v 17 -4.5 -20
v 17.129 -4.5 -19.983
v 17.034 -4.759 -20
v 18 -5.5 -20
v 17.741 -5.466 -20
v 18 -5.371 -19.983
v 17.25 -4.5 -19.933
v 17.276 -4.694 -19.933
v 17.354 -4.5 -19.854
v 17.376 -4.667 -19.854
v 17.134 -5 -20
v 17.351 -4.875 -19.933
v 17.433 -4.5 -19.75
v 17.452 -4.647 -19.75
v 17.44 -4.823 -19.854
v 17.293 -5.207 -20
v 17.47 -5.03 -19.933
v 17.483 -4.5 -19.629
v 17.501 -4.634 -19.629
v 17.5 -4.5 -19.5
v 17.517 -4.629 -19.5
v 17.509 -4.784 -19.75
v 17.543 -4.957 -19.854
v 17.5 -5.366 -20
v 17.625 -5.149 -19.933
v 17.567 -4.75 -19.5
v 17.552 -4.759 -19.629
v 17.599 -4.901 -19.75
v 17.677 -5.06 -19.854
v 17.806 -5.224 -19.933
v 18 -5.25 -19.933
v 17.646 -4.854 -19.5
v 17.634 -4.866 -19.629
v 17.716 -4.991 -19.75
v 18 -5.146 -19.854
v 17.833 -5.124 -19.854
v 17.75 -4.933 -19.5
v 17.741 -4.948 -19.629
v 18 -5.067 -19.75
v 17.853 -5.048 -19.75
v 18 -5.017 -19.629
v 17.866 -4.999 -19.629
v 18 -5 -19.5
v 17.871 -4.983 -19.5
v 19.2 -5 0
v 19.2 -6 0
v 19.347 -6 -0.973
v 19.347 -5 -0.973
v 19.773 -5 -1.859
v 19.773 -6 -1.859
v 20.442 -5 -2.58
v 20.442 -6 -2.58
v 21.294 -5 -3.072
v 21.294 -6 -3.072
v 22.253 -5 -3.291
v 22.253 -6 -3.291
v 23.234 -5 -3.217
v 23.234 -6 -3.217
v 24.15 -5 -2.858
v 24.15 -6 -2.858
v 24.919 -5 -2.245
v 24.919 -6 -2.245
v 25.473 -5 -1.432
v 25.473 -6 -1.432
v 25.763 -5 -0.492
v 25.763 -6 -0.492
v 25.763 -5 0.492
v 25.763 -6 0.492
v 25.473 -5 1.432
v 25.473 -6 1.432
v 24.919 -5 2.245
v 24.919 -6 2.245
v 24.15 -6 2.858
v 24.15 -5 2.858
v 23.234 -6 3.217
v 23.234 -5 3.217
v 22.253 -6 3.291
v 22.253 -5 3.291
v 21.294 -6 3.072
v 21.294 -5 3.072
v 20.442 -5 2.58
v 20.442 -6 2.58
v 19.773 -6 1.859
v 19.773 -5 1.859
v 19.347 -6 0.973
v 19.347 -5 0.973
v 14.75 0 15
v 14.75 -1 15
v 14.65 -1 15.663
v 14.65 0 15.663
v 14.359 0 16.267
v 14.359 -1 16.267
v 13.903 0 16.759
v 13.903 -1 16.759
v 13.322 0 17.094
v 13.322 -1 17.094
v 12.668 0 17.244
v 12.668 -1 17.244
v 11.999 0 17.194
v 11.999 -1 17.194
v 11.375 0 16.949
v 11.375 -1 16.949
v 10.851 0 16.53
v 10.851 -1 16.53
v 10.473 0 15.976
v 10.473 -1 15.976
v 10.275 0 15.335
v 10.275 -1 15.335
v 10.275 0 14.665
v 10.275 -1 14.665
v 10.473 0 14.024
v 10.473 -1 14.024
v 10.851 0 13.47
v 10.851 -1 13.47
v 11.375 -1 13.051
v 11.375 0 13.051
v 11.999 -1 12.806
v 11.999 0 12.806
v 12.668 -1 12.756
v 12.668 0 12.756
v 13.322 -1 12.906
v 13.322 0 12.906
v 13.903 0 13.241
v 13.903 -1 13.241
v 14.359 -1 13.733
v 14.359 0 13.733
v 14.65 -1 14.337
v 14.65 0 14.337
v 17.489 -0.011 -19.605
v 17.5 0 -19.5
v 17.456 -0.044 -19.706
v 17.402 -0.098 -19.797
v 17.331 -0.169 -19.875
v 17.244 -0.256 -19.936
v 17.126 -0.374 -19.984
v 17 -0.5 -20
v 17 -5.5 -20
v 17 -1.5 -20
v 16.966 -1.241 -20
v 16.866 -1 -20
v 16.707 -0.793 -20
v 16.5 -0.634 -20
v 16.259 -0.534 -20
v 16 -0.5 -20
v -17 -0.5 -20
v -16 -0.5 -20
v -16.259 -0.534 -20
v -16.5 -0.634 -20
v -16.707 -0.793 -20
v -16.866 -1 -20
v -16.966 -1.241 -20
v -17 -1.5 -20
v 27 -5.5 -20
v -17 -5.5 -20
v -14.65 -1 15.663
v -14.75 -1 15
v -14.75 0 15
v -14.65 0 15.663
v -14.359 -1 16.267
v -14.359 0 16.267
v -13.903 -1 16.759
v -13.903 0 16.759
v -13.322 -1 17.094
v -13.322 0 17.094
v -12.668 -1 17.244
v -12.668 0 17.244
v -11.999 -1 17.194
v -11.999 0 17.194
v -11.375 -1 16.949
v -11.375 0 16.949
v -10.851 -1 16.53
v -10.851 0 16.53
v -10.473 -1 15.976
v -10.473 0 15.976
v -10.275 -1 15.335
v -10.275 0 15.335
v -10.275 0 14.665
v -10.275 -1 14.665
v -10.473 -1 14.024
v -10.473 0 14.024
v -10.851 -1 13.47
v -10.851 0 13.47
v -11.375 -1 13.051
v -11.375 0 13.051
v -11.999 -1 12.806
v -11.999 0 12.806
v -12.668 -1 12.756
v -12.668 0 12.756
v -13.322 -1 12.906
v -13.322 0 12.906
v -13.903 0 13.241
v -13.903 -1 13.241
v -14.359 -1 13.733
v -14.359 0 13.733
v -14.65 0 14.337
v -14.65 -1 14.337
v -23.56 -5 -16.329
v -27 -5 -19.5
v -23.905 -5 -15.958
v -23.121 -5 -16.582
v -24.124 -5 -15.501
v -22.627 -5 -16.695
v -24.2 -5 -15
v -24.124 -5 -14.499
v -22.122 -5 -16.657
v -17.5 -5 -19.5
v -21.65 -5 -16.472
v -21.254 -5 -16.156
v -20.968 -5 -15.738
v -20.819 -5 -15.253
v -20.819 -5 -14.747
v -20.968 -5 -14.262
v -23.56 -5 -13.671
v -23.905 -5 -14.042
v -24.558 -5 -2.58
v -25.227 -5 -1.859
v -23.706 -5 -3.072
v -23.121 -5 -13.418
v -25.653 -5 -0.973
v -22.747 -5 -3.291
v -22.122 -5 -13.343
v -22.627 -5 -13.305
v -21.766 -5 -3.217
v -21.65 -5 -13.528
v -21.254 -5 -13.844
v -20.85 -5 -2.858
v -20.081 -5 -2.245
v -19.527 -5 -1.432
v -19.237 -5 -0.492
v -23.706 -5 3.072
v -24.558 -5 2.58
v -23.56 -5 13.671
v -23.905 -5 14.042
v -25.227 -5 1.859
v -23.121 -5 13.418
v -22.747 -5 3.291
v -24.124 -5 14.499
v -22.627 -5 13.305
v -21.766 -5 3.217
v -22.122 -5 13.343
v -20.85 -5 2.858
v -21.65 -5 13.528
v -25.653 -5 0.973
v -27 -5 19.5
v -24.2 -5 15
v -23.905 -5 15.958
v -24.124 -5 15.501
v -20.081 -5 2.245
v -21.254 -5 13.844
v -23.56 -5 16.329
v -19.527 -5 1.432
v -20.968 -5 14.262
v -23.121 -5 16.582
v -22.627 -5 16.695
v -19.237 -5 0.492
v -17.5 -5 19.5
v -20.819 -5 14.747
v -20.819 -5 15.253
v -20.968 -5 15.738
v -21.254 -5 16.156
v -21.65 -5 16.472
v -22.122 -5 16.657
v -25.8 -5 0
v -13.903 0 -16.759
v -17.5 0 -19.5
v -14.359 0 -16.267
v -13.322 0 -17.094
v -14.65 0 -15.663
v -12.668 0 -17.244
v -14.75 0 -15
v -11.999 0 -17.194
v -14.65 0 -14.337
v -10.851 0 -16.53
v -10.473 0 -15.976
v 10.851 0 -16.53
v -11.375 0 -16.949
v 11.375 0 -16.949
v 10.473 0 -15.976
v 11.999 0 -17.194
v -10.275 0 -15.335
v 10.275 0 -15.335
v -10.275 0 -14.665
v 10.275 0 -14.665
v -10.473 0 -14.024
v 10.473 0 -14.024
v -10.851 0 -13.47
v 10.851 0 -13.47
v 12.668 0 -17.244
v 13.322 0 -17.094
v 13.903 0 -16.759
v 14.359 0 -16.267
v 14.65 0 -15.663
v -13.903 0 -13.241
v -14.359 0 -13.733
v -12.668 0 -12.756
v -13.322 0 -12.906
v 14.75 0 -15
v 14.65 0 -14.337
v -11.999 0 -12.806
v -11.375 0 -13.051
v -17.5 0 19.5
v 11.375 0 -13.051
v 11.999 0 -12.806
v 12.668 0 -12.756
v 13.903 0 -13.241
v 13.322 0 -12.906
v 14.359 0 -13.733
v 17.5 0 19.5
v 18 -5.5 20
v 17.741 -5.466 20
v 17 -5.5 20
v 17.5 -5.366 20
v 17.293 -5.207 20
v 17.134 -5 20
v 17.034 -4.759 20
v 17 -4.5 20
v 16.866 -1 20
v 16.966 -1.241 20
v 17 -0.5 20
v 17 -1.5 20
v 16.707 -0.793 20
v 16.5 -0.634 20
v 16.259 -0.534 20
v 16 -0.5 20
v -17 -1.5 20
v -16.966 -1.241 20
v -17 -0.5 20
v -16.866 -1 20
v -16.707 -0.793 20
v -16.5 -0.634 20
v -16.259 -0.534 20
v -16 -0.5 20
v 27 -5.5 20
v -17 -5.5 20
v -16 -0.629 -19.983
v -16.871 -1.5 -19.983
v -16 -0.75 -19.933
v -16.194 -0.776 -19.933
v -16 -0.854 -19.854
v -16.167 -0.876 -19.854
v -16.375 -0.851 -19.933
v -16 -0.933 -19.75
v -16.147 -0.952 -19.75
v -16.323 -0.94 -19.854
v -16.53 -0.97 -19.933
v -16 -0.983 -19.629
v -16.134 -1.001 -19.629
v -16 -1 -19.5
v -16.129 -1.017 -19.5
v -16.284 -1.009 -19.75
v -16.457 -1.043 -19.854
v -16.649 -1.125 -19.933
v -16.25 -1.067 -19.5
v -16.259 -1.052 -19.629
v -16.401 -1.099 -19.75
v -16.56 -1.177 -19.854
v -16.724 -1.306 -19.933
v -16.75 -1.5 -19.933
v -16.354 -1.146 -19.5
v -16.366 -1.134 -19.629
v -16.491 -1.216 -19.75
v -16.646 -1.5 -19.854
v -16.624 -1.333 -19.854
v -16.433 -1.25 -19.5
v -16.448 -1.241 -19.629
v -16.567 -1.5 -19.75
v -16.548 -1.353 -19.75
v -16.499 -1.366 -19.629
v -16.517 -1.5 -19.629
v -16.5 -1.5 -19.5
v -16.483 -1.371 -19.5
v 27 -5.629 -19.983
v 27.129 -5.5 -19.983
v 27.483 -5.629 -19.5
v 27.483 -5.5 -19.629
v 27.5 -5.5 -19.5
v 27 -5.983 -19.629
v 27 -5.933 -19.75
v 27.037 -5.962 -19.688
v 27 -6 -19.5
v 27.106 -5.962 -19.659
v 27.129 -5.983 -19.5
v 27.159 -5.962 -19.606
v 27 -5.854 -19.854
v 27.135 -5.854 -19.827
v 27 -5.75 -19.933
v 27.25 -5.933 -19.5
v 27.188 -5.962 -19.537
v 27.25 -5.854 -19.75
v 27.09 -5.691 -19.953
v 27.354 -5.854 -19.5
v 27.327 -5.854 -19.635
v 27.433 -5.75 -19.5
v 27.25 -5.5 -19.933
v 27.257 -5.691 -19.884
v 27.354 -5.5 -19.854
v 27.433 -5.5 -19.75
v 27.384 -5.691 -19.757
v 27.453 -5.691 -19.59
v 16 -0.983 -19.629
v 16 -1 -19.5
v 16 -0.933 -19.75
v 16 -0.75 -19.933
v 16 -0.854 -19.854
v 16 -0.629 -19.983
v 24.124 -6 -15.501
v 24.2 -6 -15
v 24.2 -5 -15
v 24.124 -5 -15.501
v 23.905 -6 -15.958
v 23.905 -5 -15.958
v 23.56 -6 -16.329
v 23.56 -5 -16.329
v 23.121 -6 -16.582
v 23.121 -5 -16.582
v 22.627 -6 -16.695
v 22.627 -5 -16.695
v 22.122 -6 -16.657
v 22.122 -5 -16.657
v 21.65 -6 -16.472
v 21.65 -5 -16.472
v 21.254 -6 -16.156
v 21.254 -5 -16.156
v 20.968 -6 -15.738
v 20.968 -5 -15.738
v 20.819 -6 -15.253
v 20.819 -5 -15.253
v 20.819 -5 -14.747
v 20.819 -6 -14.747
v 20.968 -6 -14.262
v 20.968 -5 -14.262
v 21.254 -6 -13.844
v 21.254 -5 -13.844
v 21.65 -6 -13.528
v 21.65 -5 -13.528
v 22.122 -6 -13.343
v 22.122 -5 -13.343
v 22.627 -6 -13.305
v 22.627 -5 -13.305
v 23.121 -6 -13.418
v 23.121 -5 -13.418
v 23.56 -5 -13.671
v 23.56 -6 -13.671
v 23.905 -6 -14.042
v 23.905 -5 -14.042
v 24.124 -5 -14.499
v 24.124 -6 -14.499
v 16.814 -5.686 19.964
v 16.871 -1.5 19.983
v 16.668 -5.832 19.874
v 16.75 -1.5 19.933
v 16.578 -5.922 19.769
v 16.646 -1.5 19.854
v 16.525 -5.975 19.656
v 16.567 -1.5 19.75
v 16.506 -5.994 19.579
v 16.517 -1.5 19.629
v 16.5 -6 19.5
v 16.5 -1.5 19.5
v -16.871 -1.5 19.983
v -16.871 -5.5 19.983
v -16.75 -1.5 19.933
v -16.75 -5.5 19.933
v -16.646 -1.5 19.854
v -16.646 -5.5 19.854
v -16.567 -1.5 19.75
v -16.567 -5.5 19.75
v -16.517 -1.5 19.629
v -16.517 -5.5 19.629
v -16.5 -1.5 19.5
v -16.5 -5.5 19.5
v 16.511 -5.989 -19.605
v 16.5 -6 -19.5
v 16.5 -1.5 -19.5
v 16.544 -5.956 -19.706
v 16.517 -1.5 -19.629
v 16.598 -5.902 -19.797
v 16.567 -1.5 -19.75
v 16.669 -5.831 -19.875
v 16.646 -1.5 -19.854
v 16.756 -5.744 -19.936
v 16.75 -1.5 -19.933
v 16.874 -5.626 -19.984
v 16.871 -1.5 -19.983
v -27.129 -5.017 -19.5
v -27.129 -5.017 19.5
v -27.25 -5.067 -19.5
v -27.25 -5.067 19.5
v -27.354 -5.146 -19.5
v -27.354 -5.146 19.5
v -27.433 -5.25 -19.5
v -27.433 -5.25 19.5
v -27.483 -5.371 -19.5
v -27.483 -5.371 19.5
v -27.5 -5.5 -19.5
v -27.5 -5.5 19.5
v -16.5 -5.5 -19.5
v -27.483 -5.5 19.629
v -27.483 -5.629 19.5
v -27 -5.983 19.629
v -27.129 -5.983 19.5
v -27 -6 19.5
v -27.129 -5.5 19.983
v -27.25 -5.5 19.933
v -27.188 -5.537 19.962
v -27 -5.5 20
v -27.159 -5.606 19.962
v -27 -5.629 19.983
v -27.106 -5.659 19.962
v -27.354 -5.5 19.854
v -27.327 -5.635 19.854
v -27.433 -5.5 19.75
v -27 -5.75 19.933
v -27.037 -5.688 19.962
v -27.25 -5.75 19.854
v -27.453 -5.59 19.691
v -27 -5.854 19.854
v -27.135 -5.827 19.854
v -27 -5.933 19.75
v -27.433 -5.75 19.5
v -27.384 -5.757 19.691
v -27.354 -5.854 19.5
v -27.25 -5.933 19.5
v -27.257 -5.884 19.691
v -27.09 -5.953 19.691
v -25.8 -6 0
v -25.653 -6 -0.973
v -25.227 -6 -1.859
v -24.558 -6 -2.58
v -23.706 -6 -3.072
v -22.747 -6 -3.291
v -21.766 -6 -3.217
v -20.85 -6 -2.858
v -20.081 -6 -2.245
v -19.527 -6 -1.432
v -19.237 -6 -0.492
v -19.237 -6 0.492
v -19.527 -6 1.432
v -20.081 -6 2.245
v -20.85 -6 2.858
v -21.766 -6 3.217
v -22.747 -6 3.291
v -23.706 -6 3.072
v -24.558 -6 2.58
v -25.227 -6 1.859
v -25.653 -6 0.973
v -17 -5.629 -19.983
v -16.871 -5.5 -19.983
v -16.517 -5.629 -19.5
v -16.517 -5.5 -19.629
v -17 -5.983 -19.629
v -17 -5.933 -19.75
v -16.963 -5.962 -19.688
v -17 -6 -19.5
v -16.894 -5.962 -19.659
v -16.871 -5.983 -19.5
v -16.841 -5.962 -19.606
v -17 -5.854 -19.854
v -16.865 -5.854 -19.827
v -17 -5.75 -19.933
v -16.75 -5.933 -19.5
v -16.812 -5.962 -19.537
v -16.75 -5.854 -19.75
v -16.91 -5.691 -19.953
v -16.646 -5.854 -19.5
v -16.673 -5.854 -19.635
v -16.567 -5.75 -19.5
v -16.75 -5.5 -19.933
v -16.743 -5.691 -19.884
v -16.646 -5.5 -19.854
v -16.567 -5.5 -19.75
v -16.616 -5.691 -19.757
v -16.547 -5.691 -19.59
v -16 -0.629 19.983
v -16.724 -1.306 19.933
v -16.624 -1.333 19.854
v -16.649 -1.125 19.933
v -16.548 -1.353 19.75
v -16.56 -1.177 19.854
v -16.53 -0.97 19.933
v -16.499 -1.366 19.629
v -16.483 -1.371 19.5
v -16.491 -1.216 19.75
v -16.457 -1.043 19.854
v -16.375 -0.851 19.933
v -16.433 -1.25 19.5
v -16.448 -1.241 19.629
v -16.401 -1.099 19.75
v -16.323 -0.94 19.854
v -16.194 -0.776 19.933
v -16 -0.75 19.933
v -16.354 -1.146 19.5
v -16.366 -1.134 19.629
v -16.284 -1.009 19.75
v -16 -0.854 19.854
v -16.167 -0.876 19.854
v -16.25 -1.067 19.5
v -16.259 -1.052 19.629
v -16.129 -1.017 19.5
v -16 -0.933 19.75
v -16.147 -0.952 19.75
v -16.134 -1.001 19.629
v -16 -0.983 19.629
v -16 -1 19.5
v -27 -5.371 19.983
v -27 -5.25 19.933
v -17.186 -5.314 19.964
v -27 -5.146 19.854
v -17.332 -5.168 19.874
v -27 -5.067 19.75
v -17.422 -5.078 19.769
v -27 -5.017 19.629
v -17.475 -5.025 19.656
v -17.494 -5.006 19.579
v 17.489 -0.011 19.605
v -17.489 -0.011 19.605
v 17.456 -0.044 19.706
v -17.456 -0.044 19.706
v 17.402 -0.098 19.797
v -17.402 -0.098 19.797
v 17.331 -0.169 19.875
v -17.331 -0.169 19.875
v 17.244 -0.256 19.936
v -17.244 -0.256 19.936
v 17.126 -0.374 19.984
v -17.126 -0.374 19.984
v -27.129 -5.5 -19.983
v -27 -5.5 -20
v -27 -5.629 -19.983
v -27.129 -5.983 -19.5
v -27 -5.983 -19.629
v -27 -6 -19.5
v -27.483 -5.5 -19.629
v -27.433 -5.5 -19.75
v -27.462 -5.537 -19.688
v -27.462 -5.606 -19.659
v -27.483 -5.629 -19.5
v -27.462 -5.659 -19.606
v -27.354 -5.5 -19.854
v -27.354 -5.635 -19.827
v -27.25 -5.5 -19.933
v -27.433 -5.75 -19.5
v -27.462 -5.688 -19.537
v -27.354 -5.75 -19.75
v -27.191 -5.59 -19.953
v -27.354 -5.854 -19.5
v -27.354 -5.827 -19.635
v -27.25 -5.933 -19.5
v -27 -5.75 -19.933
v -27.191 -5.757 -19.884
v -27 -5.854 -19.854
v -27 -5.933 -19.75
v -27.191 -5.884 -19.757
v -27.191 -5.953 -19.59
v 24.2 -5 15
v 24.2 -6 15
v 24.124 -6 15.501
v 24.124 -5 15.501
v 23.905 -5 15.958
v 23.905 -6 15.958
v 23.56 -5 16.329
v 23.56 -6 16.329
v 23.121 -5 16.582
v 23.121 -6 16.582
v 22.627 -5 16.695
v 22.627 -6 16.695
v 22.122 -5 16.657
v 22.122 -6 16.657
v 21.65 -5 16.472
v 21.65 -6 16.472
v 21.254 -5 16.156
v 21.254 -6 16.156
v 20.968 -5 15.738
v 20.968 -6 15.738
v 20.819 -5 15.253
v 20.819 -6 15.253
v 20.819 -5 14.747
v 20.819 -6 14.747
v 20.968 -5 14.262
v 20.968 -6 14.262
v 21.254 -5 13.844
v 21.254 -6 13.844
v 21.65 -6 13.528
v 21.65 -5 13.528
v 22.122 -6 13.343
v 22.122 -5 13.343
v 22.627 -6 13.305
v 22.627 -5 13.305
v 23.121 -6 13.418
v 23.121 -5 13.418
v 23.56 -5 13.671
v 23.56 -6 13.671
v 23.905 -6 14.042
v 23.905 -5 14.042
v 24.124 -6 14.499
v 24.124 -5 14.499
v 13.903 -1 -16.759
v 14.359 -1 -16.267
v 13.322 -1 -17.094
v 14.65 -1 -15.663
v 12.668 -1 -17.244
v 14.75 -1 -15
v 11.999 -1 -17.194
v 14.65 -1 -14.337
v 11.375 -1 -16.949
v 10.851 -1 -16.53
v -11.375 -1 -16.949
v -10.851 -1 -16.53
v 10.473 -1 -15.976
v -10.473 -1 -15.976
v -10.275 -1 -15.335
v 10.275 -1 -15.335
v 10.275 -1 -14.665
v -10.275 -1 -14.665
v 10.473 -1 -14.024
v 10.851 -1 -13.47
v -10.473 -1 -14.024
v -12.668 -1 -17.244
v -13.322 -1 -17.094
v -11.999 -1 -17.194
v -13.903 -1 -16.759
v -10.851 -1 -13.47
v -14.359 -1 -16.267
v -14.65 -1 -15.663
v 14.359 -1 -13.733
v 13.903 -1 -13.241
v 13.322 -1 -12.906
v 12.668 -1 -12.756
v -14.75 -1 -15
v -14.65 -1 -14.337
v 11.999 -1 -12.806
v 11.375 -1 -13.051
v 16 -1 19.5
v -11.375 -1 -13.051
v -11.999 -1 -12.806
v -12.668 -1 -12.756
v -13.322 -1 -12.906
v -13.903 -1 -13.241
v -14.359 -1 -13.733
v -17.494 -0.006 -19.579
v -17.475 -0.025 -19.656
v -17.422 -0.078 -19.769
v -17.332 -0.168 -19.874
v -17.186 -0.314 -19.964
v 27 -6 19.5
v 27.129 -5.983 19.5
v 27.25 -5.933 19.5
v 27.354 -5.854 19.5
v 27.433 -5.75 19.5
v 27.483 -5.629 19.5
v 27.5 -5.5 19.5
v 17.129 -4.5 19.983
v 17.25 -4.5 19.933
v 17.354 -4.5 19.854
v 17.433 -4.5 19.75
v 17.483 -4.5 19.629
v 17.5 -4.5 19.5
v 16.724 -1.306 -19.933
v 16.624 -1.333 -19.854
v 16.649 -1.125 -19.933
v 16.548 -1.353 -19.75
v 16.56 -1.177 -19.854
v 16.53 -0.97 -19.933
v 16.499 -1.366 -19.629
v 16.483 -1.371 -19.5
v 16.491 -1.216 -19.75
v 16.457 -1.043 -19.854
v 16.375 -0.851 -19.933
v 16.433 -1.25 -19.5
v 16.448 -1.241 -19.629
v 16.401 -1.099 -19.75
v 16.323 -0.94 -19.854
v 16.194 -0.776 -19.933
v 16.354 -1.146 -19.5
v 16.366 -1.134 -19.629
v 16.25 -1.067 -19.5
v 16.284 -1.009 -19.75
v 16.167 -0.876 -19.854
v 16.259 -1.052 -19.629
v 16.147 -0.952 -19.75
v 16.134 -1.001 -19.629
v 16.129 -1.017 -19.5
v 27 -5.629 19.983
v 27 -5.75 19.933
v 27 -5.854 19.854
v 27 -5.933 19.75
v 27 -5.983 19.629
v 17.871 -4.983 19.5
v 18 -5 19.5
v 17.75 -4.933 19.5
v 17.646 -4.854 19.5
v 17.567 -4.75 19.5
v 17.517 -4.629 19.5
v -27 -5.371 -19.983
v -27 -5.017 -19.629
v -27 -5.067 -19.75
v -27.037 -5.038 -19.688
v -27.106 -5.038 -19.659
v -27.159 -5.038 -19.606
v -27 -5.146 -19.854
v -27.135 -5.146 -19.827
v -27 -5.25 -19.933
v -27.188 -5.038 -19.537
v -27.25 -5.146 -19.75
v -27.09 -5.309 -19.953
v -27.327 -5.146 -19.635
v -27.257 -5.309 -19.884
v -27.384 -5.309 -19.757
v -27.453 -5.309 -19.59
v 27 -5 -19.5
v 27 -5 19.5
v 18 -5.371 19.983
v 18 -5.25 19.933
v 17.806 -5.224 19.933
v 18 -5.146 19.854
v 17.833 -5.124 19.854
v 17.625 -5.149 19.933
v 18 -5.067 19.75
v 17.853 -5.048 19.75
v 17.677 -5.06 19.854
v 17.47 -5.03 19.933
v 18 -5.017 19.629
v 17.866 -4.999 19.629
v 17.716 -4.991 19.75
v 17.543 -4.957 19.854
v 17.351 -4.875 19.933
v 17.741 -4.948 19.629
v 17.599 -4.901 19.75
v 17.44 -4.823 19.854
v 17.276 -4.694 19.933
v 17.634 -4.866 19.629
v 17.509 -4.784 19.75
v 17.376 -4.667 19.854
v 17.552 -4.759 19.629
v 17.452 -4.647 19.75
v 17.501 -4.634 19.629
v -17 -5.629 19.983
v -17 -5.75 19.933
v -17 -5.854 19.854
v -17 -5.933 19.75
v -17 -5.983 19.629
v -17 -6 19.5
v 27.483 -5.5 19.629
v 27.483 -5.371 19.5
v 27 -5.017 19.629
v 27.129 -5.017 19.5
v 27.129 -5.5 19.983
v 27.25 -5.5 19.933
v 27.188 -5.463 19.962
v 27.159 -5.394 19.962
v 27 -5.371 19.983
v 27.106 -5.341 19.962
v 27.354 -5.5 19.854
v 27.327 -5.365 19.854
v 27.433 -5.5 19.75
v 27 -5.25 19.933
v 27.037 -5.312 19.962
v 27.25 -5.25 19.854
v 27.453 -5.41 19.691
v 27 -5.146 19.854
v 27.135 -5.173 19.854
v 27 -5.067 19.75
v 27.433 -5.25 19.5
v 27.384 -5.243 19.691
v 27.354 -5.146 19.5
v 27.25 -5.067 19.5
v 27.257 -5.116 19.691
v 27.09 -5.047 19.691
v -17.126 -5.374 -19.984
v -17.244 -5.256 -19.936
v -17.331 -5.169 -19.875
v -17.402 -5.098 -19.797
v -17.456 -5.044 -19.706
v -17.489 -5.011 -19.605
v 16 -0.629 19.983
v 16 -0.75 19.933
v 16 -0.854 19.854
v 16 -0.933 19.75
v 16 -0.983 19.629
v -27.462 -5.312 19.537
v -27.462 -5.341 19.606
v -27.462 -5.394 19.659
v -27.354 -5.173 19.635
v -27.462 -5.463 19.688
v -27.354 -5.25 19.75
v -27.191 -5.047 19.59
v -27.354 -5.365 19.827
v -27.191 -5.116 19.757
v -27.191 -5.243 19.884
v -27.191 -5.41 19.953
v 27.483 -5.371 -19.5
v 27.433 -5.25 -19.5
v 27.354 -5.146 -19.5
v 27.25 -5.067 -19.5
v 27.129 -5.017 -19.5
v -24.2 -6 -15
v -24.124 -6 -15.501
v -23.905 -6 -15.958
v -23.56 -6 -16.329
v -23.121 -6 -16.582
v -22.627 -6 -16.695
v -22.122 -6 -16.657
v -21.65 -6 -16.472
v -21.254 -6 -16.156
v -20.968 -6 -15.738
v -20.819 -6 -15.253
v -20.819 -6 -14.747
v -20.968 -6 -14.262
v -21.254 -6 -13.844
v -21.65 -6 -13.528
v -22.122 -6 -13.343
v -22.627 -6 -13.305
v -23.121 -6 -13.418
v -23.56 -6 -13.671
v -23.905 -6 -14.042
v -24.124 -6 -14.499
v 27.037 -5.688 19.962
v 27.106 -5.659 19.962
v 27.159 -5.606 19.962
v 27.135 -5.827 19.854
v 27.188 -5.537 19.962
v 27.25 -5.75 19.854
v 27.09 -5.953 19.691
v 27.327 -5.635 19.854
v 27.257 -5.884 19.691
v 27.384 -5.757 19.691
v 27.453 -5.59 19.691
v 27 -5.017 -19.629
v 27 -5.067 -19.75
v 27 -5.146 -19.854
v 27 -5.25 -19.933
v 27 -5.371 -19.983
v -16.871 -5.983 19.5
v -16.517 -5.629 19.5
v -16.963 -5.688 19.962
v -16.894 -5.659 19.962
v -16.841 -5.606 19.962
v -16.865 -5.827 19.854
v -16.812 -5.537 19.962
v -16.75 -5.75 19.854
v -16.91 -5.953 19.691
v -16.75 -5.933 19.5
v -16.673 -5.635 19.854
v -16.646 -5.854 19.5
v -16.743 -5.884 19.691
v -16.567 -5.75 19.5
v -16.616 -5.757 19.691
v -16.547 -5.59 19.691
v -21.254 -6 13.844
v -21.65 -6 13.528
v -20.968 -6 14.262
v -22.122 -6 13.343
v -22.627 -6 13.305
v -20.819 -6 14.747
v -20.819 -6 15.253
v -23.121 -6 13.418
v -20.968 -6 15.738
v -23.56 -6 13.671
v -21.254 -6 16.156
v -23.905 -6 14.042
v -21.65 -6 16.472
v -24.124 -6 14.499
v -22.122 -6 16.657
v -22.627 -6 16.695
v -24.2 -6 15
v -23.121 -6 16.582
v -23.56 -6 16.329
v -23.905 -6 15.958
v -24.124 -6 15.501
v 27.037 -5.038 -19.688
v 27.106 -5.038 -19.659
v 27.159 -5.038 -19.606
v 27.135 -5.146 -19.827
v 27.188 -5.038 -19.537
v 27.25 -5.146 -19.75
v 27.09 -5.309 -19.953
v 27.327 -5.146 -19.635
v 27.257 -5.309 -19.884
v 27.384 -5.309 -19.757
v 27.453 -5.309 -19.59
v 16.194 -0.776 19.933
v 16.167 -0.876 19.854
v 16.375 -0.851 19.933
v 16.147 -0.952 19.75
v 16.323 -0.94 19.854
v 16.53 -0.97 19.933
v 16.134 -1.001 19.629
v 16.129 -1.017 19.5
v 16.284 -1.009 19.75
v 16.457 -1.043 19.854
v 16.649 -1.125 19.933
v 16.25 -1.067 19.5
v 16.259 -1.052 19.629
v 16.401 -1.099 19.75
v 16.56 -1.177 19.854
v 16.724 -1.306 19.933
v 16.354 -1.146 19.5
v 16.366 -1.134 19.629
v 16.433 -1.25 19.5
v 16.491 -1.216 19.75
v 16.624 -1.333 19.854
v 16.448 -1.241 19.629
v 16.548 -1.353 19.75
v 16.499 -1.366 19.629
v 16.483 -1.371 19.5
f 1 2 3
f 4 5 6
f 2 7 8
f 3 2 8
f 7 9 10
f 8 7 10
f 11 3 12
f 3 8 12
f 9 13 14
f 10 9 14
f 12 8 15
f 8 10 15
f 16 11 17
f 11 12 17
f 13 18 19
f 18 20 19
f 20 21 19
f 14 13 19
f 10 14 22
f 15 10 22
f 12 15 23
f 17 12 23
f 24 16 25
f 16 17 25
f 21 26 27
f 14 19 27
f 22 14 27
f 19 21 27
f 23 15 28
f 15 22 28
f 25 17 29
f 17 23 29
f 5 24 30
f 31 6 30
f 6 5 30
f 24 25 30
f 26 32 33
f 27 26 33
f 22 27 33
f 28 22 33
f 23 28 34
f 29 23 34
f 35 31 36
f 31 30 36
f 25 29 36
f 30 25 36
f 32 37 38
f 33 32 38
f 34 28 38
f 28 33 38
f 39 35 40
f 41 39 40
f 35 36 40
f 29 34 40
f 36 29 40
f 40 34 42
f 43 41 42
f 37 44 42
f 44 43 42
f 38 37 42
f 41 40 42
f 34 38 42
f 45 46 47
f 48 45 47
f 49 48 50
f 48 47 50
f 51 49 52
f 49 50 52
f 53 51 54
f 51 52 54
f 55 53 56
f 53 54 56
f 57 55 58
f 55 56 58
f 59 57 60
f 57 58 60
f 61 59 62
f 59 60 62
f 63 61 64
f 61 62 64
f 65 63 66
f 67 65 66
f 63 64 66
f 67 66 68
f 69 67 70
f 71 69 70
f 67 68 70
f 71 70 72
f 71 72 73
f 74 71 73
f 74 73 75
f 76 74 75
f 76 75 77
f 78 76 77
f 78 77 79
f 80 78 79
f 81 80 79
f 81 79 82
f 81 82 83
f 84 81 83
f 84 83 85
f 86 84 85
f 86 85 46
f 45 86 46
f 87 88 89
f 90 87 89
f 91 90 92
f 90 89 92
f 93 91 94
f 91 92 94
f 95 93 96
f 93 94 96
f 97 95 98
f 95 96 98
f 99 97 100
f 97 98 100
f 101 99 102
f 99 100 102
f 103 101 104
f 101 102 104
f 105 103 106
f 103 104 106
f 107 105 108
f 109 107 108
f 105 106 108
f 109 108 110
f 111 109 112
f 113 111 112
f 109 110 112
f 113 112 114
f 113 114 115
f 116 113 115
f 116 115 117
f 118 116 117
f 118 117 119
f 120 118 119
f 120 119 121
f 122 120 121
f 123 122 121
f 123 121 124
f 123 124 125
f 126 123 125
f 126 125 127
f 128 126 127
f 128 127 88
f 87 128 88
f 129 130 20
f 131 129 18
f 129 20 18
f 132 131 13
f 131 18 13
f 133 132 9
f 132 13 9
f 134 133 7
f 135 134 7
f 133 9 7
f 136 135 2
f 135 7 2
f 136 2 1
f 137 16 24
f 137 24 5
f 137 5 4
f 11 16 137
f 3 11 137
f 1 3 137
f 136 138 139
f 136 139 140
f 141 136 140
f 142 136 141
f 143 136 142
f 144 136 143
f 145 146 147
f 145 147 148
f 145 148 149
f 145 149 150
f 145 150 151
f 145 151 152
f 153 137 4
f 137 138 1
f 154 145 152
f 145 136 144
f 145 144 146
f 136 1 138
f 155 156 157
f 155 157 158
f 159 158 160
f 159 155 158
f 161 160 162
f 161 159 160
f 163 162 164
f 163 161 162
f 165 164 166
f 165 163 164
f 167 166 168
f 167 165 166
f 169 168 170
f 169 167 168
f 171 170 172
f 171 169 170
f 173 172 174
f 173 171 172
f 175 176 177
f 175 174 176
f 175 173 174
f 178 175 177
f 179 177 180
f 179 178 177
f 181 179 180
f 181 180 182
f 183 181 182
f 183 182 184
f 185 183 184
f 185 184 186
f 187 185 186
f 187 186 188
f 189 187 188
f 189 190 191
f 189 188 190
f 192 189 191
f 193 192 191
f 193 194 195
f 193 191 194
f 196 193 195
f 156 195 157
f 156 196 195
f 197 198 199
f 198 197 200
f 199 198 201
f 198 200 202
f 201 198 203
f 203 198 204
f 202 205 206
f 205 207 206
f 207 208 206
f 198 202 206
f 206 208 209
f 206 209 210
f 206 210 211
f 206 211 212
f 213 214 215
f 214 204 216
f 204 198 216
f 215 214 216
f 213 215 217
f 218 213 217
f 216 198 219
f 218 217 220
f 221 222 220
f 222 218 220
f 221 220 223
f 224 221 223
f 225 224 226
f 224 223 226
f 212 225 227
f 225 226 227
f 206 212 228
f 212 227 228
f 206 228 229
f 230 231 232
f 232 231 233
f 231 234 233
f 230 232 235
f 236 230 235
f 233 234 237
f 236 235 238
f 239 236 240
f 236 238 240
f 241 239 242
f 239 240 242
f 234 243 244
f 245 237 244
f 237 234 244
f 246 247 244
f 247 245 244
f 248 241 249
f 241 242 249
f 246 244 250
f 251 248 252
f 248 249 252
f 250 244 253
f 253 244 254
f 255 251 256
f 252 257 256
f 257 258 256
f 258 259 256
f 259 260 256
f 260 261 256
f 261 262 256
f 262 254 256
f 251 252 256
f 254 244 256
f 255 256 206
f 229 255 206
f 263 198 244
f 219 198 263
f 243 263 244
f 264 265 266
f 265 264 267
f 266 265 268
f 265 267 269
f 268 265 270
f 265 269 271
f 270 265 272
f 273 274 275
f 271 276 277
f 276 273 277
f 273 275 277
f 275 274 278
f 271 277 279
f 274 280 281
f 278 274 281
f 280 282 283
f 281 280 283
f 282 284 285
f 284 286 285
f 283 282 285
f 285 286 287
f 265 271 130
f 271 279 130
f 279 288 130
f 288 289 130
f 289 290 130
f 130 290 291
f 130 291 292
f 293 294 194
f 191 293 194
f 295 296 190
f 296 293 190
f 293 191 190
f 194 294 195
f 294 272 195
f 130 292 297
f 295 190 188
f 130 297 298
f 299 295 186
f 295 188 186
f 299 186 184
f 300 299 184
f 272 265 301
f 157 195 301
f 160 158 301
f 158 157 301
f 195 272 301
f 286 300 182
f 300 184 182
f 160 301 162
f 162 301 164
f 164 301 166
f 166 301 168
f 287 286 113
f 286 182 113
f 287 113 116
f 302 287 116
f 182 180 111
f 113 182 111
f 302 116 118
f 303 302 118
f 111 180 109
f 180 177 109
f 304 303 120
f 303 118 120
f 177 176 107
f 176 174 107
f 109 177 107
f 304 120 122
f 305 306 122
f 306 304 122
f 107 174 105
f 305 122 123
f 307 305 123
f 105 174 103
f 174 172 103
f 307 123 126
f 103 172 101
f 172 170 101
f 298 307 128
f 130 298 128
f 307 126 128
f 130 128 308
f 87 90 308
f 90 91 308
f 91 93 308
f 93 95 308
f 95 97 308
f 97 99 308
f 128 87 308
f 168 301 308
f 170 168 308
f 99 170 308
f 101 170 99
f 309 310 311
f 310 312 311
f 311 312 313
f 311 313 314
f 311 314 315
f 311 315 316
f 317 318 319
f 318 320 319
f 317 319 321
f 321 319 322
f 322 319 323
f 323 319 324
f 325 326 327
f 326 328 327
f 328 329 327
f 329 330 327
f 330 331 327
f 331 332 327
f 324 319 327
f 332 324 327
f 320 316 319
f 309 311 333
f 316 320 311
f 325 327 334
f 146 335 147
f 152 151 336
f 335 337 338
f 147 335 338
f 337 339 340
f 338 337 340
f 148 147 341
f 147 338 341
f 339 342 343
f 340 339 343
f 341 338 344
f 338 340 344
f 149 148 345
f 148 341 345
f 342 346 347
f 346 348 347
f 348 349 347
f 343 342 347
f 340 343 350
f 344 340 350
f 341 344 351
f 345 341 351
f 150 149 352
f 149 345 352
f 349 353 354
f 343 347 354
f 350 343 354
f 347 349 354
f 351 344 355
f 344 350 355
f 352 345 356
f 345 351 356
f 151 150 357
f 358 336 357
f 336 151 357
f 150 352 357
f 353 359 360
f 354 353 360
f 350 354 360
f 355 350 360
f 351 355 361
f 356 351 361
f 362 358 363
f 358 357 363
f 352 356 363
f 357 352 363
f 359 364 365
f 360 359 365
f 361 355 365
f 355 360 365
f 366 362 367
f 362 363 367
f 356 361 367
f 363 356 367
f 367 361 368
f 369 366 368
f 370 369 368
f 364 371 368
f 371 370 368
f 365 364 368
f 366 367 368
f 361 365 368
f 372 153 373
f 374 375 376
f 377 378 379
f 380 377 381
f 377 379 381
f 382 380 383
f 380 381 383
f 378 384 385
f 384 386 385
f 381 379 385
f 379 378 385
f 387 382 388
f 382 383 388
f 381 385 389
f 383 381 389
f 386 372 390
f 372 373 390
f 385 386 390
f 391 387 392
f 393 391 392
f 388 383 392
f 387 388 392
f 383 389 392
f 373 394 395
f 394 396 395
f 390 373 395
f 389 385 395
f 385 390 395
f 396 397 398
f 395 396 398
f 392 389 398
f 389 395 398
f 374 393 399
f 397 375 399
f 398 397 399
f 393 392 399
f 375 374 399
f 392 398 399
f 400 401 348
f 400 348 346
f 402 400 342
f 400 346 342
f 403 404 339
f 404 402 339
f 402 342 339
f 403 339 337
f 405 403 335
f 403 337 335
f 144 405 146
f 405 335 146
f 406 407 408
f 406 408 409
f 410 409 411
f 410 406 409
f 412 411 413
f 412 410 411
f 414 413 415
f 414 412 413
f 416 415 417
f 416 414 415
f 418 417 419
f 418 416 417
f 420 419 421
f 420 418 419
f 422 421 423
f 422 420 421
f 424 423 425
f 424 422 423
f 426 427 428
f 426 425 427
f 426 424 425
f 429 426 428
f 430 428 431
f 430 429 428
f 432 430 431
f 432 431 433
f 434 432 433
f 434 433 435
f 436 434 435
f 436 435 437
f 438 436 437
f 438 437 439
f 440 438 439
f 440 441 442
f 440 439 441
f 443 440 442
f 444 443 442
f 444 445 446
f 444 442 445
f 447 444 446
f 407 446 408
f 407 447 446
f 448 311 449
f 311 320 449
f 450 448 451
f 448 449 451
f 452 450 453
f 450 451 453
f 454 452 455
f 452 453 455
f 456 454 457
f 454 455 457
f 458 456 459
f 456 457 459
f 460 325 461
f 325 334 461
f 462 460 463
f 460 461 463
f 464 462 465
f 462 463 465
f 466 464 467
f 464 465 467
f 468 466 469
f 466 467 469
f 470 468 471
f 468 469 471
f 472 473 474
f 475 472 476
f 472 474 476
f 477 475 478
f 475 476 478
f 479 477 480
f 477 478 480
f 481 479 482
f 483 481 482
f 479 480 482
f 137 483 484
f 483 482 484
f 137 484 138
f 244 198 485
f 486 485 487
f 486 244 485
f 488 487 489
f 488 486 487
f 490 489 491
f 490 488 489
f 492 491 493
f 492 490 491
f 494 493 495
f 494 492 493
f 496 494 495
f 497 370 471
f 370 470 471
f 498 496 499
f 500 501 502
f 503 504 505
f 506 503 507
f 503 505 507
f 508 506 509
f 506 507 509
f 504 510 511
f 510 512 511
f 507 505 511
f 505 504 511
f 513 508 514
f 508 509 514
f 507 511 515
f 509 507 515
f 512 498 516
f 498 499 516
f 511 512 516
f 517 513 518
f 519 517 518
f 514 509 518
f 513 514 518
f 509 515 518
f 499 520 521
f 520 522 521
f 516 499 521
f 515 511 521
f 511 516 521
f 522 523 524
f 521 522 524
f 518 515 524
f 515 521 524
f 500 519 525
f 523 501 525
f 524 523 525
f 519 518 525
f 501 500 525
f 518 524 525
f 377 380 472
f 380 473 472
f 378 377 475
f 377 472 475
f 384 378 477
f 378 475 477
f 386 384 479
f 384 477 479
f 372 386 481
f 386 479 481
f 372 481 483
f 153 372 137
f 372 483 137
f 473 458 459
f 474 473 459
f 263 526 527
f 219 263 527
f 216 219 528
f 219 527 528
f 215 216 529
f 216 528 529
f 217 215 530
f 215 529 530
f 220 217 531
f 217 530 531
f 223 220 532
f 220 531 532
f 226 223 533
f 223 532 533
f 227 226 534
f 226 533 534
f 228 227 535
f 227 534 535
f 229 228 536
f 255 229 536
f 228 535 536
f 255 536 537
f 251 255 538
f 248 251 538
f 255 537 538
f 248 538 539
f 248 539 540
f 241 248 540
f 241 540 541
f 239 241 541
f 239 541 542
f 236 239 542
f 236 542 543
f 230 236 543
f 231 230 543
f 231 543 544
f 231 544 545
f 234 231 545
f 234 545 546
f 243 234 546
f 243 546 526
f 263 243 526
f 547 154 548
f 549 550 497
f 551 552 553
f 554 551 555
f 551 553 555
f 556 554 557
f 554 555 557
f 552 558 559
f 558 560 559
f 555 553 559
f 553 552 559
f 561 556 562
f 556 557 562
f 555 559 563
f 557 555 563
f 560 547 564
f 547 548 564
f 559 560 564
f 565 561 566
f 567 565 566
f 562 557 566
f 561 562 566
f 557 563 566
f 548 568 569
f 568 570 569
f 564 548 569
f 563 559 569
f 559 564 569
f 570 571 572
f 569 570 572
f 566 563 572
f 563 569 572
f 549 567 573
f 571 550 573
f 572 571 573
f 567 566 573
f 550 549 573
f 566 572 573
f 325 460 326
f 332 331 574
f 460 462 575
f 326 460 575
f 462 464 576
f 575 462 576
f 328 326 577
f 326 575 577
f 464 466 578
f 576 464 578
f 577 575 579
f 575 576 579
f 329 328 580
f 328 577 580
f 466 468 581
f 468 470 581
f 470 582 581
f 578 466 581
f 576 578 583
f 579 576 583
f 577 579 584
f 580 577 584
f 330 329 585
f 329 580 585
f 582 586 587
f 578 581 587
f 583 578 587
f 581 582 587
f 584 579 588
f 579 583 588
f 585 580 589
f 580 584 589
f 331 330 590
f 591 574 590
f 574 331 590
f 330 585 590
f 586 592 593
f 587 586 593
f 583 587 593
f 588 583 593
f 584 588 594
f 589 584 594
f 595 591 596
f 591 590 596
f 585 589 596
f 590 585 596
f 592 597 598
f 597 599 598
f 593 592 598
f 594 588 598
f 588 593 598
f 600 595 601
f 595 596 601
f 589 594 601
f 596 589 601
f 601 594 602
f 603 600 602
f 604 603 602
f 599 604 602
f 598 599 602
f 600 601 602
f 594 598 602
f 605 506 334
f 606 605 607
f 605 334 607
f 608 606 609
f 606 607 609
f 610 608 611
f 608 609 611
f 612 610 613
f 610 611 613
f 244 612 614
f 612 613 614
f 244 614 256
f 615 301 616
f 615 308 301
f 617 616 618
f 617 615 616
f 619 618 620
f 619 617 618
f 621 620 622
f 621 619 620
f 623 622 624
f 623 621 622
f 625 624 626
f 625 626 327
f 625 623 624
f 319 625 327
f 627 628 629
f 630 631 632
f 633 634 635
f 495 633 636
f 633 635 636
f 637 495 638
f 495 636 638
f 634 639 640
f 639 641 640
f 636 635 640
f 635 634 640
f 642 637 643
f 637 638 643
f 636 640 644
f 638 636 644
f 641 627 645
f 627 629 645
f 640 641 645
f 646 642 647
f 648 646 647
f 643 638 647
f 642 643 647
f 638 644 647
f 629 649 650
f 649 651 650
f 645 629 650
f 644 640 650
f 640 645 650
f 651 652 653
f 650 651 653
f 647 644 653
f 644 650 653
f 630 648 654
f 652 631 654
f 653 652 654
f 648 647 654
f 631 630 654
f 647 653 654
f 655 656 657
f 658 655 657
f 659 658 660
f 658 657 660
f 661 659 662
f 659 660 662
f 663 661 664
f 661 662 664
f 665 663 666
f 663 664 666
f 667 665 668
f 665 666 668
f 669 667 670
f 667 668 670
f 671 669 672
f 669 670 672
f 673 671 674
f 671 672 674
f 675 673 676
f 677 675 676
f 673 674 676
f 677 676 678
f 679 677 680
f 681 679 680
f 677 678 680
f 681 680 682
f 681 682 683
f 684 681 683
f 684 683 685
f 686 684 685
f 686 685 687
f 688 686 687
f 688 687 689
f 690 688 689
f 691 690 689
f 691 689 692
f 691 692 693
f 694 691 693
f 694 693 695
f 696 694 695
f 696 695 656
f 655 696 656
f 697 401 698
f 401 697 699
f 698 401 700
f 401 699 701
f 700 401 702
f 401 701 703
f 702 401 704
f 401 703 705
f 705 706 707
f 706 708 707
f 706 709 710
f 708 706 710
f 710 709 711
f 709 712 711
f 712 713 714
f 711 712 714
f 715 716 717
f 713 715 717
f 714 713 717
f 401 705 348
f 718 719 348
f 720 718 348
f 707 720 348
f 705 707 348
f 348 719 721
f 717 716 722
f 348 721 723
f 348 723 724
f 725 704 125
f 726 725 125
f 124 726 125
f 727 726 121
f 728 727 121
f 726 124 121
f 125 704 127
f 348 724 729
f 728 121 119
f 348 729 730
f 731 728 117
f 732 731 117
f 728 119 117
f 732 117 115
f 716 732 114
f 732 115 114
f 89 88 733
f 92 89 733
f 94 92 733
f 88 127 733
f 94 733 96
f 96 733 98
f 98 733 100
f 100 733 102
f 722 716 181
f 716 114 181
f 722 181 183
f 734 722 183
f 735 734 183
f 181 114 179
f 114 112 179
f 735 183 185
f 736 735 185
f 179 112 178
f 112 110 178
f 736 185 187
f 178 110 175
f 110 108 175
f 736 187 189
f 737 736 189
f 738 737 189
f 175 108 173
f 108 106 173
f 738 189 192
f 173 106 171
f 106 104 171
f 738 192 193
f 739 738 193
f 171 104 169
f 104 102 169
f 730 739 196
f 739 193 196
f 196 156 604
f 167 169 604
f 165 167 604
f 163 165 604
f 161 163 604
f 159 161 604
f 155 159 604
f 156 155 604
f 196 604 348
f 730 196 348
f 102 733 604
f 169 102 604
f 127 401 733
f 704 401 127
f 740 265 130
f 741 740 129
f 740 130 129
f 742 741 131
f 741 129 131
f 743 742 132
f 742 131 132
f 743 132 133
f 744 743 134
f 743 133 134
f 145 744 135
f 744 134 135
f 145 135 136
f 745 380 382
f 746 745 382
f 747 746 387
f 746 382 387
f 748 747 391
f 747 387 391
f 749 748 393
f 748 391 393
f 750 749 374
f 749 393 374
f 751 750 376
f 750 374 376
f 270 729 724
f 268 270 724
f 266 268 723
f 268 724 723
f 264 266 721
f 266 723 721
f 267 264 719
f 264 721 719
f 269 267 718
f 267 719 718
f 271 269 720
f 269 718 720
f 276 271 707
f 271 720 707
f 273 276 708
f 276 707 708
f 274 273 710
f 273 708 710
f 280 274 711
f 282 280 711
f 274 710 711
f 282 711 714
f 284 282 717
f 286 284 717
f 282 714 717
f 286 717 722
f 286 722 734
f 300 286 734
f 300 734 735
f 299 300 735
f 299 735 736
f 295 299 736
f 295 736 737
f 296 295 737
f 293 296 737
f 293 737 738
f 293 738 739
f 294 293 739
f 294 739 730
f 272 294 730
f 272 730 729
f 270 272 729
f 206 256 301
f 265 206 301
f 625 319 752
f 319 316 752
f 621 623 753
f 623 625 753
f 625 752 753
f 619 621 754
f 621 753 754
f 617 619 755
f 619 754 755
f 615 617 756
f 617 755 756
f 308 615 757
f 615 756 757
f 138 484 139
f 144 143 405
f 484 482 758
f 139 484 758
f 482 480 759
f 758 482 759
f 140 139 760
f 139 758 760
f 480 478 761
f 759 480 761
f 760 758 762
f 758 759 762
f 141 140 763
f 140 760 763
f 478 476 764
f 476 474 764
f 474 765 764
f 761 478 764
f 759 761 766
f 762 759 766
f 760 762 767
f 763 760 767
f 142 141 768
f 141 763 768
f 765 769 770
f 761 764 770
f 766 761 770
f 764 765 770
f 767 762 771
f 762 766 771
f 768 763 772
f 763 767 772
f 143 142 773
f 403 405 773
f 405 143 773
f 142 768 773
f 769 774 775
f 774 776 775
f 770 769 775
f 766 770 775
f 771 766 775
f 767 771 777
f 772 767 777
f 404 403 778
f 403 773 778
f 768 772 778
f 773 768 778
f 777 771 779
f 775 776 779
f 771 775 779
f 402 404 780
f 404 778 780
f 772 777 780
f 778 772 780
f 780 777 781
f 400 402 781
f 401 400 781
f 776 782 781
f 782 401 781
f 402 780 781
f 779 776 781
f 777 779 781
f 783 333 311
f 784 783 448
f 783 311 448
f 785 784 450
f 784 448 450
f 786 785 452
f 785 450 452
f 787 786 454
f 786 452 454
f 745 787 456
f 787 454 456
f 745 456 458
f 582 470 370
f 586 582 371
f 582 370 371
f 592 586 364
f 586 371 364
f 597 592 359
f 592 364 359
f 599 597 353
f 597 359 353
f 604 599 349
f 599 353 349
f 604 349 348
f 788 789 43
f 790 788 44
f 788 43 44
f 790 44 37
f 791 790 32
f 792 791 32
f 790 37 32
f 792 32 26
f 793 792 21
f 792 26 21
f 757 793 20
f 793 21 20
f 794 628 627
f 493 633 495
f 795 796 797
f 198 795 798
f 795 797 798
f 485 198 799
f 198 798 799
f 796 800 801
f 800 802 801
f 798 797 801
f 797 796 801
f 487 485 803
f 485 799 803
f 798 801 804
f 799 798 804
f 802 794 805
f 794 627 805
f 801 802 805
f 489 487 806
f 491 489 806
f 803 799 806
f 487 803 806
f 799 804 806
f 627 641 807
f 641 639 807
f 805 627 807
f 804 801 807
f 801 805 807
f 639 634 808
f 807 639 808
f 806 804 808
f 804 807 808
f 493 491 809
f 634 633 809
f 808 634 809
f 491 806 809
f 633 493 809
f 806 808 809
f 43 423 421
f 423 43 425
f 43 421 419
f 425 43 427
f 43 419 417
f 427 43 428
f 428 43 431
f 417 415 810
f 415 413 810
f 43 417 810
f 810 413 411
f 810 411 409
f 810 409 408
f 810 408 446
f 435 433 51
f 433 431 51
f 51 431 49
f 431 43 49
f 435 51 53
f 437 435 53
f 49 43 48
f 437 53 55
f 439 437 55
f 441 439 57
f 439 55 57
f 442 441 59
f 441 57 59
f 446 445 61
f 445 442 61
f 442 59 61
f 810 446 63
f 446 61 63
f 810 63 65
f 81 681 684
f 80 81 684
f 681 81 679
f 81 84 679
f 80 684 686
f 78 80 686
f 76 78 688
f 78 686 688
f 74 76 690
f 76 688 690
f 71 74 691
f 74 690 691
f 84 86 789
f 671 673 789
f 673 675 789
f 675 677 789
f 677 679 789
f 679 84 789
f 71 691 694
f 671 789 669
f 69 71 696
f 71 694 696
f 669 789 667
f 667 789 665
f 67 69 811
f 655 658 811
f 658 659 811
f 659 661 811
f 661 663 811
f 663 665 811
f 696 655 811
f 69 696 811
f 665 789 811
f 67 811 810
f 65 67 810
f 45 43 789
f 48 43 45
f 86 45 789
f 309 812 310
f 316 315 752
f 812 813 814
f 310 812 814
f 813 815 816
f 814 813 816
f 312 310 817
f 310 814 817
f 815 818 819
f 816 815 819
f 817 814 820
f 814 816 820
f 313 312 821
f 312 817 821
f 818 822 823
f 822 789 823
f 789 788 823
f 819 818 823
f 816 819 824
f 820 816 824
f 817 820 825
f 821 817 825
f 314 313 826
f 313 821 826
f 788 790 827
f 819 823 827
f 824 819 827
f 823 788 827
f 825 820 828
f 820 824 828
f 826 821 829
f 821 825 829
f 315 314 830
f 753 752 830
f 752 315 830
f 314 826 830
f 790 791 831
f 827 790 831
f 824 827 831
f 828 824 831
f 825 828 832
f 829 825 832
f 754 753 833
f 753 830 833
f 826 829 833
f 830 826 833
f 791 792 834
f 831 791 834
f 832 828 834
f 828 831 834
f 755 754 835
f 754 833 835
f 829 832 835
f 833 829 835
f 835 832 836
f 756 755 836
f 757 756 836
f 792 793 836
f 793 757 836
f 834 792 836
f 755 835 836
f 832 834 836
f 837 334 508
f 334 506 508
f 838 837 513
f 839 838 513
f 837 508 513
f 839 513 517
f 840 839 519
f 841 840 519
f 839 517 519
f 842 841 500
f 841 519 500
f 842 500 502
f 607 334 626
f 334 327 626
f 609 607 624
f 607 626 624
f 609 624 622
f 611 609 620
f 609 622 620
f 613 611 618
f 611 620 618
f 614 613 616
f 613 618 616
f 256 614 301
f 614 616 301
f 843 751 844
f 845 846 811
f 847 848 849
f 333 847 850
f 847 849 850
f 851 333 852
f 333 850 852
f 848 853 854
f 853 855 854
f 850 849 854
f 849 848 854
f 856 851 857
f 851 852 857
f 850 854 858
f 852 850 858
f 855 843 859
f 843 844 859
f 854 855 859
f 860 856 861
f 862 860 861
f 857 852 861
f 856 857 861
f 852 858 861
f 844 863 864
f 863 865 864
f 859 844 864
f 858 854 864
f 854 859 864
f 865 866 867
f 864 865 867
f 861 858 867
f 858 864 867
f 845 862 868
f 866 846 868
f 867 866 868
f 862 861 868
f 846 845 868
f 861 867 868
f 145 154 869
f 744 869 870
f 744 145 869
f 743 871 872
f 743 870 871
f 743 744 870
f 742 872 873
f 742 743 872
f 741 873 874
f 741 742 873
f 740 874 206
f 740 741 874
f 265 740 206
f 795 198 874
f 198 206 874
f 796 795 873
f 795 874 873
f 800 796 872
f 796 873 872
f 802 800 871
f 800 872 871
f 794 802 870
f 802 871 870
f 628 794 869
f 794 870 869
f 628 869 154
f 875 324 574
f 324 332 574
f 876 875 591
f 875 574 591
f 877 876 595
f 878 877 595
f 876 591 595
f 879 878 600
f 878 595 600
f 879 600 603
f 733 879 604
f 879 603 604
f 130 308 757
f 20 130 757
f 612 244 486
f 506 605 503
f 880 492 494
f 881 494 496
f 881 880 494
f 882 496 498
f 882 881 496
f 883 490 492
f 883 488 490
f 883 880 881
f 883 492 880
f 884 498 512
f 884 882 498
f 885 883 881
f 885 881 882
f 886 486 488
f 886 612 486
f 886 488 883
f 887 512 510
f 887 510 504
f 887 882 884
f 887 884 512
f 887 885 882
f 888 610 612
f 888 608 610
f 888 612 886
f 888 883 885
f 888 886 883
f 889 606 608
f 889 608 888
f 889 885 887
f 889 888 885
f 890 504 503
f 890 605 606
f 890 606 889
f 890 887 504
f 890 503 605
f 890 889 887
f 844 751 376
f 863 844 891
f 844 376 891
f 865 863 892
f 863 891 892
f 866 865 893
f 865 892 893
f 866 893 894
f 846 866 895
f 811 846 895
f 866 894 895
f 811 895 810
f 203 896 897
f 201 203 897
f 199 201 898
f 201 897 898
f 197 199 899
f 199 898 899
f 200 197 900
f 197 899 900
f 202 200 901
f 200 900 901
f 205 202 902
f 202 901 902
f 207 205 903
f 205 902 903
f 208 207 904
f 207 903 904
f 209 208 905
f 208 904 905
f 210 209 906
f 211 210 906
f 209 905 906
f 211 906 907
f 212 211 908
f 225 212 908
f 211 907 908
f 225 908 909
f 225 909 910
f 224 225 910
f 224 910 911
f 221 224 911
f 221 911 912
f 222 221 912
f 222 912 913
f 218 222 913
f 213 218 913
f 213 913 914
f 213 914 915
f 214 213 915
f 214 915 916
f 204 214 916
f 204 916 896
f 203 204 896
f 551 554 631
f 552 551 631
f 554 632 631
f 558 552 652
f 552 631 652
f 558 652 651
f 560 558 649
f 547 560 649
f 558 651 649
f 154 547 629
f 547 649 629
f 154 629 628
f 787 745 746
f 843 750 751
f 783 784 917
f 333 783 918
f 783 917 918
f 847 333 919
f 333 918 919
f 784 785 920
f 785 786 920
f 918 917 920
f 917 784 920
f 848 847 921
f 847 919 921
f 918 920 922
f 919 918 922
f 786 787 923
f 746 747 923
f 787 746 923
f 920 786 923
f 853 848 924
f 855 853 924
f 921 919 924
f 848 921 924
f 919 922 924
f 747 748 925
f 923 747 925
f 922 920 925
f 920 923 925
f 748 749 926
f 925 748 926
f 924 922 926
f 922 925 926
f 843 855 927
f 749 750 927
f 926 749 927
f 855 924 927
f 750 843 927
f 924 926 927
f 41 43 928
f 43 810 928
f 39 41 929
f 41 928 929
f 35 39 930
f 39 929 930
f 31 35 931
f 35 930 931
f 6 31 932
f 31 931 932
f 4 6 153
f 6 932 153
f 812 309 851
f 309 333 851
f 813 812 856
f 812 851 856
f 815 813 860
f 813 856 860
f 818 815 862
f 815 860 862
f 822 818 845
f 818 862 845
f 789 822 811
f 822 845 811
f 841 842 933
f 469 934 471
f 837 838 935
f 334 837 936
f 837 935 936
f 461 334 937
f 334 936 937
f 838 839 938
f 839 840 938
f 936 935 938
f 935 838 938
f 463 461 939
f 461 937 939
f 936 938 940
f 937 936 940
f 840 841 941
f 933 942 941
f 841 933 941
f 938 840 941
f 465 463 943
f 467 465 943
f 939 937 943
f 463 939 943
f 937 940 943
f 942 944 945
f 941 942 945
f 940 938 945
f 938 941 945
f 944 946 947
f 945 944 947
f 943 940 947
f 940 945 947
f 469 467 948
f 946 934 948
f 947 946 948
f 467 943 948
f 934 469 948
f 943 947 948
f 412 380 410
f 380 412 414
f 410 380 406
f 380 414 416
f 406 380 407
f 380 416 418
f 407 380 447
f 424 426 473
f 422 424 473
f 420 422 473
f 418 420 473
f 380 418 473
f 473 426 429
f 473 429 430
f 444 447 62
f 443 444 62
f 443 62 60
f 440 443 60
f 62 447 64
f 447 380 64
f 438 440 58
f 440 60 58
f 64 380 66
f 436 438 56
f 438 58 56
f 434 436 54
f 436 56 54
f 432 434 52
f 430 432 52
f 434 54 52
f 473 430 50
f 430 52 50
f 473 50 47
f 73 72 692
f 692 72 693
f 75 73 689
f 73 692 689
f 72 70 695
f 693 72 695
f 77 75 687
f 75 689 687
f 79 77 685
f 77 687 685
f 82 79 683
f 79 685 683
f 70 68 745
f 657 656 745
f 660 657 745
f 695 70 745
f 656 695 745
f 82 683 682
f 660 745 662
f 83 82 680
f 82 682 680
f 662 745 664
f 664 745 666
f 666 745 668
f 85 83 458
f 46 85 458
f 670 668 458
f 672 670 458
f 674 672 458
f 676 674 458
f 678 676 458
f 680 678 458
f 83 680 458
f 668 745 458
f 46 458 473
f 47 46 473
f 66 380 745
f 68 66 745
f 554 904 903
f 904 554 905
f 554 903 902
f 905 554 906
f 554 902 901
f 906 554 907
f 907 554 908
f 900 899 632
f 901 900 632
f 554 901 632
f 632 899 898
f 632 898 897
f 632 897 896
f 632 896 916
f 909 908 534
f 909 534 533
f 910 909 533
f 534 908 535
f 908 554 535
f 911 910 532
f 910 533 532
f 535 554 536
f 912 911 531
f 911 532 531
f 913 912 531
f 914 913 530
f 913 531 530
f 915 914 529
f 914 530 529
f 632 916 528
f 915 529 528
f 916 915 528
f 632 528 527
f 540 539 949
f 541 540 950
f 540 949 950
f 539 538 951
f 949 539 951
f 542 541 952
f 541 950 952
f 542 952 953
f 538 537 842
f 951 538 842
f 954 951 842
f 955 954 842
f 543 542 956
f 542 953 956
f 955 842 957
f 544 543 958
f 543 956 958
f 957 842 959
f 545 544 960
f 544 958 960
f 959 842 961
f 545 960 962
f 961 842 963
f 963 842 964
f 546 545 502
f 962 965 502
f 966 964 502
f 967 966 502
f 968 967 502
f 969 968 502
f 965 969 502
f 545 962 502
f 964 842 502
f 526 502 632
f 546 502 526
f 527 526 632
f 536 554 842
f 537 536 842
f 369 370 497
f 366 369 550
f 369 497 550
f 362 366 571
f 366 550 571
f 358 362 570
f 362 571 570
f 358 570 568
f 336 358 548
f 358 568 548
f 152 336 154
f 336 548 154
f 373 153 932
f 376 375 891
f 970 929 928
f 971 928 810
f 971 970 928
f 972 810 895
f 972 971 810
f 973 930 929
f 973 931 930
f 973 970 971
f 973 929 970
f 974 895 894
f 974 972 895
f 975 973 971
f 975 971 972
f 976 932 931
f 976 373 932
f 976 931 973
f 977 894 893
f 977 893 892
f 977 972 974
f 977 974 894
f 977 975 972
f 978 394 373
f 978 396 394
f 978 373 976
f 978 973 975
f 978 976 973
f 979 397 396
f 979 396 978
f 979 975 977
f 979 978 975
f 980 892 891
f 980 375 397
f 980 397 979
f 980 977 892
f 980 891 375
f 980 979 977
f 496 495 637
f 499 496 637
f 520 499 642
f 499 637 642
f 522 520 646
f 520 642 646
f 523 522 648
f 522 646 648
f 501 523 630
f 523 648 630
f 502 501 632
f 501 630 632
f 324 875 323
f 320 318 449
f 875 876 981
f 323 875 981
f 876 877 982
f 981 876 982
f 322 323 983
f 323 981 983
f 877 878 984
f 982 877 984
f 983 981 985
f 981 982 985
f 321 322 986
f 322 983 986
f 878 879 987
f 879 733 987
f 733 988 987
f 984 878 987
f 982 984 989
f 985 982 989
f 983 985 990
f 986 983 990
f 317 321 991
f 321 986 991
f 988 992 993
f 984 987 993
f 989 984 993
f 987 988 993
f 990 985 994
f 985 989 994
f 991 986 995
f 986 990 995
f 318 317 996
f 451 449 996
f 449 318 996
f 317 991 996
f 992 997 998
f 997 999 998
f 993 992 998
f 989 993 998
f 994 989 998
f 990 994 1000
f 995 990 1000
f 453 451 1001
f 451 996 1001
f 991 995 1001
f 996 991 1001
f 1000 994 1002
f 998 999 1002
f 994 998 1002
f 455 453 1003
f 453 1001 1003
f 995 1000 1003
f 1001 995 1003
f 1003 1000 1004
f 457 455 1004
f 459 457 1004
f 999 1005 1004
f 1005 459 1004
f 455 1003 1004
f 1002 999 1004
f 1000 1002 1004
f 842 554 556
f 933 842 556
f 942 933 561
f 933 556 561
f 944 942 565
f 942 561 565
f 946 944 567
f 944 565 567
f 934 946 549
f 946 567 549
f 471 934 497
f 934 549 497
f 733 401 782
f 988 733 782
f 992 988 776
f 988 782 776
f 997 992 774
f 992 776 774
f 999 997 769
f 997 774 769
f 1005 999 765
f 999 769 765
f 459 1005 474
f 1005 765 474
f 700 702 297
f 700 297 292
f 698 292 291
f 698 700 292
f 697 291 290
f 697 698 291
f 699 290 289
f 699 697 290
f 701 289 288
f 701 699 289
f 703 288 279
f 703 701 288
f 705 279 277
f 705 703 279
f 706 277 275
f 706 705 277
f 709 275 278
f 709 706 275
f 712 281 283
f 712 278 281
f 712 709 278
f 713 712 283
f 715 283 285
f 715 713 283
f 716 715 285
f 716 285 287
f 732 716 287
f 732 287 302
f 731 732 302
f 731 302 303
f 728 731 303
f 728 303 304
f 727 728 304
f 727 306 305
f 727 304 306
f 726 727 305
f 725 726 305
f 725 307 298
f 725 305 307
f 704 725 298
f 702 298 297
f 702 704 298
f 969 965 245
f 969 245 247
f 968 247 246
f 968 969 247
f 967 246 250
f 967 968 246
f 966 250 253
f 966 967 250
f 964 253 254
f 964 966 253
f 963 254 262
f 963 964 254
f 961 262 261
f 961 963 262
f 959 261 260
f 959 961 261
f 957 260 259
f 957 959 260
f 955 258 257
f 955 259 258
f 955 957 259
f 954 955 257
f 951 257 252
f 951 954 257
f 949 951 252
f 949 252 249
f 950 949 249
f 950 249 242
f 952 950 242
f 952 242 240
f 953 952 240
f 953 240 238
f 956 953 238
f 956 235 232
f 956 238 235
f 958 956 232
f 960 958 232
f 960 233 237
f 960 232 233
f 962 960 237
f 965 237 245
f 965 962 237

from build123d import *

# Parameters (mm, degrees)
BOSS_EXTRUDE1_DEPTH  = 20
FILLET1_R            = 0.5
M6_CLEARANCE_HOLE1_D = 6.6
M4_CLEARANCE_HOLE1_D = 4.5
M3_CLEARANCE_HOLE1_D = 3.4
MIRROR2_COPY_1_D     = 4.5
MIRROR2_COPY_2_D     = 3.4


with BuildPart() as part:
    # Sketch1 → Boss-Extrude1 (new, symmetric)
    with BuildSketch(Plane.XY):
        Polygon((-17.5, 0), (17.5, 0), (17.5, -5), (27.5, -5), (27.5, -6), (16.5, -6), (16.5, -1), (-16.5, -1), (-16.5, -6), (-27.5, -6), (-27.5, -5), (-17.5, -5), align=None)
    extrude(amount=BOSS_EXTRUDE1_DEPTH, both=True)

    # Fillet1
    fillet1_edges = [part.edges().sort_by_distance(p)[0] for p in [
        (27.5, -5.5, -20),
        (22, -6, -20),
        (0, 0, 20),
        (16.5, -3.5, -20),
        (0, -1, -20),
        (-16.5, -3.5, -20),
        (-22, -6, -20),
        (-27.5, -5.5, -20),
        (-22.5, -5, -20),
        (-17.5, -2.5, -20),
        (0, 0, -20),
        (17.5, -2.5, -20),
        (22.5, -5, -20),
        (-17.5, -2.5, 20),
        (27.5, -5, 0),
        (27.5, -6, 0),
        (-22.5, -5, 20),
        (16.5, -1, 0),
        (-16.5, -1, 0),
        (-16.5, -6, 0),
        (-27.5, -6, 0),
        (-27.5, -5, 0),
        (17.5, -5, 0),
        (-27.5, -5.5, 20),
        (-22, -6, 20),
        (-16.5, -3.5, 20),
        (0, -1, 20),
        (16.5, -3.5, 20),
        (22, -6, 20),
        (27.5, -5.5, 20),
        (22.5, -5, 20),
        (17.5, -2.5, 20),
    ]]
    fillet(fillet1_edges, radius=FILLET1_R - 0.0001)  # a hair under: the kernel refuses the full size

    # M6 Clearance Hole1 (through all)
    with Locations(Plane(origin=(0, -5, 0), x_dir=(1, 0, 0), z_dir=(0, 1, 0))):
        with Locations((-22.5, 0), (22.5, 0)):
            Hole(M6_CLEARANCE_HOLE1_D / 2)

    # M4 Clearance Hole1 (through all)
    with Locations(Plane(origin=(0, 0, 0), x_dir=(1, 0, 0), z_dir=(0, 1, 0))):
        with Locations((-12.5, 15)):
            m4_clearance_hole1 = Hole(M4_CLEARANCE_HOLE1_D / 2)

    # M3 Clearance Hole1 (through all)
    with Locations(Plane(origin=(0, -5, 0), x_dir=(1, 0, 0), z_dir=(0, 1, 0))):
        with Locations((-22.5, 15)):
            m3_clearance_hole1 = Hole(M3_CLEARANCE_HOLE1_D / 2)

    # Mirror1: M4 Clearance Hole1, M3 Clearance Hole1 across plane
    add(m4_clearance_hole1.mirror(Plane(origin=(0, 0, 0), x_dir=(0, 0, 1), z_dir=(1, 0, 0))), mode=Mode.SUBTRACT)
    add(m3_clearance_hole1.mirror(Plane(origin=(0, 0, 0), x_dir=(0, 0, 1), z_dir=(1, 0, 0))), mode=Mode.SUBTRACT)

    # Mirror2: M4 Clearance Hole1, M3 Clearance Hole1 across plane
    add(m4_clearance_hole1.mirror(Plane.XY), mode=Mode.SUBTRACT)
    add(m3_clearance_hole1.mirror(Plane.XY), mode=Mode.SUBTRACT)

    # Mirror2 copy 1 (through all)
    with Locations(Plane(origin=(0, 0, 0), x_dir=(-1, 0, 0), z_dir=(0, 1, 0))):
        with Locations((-12.5, 15)):
            Hole(MIRROR2_COPY_1_D / 2)

    # Mirror2 copy 2 (through all)
    with Locations(Plane(origin=(0, -5, 0), x_dir=(-1, 0, 0), z_dir=(0, 1, 0))):
        with Locations((-22.5, 15)):
            Hole(MIRROR2_COPY_2_D / 2)


solid = part.part
